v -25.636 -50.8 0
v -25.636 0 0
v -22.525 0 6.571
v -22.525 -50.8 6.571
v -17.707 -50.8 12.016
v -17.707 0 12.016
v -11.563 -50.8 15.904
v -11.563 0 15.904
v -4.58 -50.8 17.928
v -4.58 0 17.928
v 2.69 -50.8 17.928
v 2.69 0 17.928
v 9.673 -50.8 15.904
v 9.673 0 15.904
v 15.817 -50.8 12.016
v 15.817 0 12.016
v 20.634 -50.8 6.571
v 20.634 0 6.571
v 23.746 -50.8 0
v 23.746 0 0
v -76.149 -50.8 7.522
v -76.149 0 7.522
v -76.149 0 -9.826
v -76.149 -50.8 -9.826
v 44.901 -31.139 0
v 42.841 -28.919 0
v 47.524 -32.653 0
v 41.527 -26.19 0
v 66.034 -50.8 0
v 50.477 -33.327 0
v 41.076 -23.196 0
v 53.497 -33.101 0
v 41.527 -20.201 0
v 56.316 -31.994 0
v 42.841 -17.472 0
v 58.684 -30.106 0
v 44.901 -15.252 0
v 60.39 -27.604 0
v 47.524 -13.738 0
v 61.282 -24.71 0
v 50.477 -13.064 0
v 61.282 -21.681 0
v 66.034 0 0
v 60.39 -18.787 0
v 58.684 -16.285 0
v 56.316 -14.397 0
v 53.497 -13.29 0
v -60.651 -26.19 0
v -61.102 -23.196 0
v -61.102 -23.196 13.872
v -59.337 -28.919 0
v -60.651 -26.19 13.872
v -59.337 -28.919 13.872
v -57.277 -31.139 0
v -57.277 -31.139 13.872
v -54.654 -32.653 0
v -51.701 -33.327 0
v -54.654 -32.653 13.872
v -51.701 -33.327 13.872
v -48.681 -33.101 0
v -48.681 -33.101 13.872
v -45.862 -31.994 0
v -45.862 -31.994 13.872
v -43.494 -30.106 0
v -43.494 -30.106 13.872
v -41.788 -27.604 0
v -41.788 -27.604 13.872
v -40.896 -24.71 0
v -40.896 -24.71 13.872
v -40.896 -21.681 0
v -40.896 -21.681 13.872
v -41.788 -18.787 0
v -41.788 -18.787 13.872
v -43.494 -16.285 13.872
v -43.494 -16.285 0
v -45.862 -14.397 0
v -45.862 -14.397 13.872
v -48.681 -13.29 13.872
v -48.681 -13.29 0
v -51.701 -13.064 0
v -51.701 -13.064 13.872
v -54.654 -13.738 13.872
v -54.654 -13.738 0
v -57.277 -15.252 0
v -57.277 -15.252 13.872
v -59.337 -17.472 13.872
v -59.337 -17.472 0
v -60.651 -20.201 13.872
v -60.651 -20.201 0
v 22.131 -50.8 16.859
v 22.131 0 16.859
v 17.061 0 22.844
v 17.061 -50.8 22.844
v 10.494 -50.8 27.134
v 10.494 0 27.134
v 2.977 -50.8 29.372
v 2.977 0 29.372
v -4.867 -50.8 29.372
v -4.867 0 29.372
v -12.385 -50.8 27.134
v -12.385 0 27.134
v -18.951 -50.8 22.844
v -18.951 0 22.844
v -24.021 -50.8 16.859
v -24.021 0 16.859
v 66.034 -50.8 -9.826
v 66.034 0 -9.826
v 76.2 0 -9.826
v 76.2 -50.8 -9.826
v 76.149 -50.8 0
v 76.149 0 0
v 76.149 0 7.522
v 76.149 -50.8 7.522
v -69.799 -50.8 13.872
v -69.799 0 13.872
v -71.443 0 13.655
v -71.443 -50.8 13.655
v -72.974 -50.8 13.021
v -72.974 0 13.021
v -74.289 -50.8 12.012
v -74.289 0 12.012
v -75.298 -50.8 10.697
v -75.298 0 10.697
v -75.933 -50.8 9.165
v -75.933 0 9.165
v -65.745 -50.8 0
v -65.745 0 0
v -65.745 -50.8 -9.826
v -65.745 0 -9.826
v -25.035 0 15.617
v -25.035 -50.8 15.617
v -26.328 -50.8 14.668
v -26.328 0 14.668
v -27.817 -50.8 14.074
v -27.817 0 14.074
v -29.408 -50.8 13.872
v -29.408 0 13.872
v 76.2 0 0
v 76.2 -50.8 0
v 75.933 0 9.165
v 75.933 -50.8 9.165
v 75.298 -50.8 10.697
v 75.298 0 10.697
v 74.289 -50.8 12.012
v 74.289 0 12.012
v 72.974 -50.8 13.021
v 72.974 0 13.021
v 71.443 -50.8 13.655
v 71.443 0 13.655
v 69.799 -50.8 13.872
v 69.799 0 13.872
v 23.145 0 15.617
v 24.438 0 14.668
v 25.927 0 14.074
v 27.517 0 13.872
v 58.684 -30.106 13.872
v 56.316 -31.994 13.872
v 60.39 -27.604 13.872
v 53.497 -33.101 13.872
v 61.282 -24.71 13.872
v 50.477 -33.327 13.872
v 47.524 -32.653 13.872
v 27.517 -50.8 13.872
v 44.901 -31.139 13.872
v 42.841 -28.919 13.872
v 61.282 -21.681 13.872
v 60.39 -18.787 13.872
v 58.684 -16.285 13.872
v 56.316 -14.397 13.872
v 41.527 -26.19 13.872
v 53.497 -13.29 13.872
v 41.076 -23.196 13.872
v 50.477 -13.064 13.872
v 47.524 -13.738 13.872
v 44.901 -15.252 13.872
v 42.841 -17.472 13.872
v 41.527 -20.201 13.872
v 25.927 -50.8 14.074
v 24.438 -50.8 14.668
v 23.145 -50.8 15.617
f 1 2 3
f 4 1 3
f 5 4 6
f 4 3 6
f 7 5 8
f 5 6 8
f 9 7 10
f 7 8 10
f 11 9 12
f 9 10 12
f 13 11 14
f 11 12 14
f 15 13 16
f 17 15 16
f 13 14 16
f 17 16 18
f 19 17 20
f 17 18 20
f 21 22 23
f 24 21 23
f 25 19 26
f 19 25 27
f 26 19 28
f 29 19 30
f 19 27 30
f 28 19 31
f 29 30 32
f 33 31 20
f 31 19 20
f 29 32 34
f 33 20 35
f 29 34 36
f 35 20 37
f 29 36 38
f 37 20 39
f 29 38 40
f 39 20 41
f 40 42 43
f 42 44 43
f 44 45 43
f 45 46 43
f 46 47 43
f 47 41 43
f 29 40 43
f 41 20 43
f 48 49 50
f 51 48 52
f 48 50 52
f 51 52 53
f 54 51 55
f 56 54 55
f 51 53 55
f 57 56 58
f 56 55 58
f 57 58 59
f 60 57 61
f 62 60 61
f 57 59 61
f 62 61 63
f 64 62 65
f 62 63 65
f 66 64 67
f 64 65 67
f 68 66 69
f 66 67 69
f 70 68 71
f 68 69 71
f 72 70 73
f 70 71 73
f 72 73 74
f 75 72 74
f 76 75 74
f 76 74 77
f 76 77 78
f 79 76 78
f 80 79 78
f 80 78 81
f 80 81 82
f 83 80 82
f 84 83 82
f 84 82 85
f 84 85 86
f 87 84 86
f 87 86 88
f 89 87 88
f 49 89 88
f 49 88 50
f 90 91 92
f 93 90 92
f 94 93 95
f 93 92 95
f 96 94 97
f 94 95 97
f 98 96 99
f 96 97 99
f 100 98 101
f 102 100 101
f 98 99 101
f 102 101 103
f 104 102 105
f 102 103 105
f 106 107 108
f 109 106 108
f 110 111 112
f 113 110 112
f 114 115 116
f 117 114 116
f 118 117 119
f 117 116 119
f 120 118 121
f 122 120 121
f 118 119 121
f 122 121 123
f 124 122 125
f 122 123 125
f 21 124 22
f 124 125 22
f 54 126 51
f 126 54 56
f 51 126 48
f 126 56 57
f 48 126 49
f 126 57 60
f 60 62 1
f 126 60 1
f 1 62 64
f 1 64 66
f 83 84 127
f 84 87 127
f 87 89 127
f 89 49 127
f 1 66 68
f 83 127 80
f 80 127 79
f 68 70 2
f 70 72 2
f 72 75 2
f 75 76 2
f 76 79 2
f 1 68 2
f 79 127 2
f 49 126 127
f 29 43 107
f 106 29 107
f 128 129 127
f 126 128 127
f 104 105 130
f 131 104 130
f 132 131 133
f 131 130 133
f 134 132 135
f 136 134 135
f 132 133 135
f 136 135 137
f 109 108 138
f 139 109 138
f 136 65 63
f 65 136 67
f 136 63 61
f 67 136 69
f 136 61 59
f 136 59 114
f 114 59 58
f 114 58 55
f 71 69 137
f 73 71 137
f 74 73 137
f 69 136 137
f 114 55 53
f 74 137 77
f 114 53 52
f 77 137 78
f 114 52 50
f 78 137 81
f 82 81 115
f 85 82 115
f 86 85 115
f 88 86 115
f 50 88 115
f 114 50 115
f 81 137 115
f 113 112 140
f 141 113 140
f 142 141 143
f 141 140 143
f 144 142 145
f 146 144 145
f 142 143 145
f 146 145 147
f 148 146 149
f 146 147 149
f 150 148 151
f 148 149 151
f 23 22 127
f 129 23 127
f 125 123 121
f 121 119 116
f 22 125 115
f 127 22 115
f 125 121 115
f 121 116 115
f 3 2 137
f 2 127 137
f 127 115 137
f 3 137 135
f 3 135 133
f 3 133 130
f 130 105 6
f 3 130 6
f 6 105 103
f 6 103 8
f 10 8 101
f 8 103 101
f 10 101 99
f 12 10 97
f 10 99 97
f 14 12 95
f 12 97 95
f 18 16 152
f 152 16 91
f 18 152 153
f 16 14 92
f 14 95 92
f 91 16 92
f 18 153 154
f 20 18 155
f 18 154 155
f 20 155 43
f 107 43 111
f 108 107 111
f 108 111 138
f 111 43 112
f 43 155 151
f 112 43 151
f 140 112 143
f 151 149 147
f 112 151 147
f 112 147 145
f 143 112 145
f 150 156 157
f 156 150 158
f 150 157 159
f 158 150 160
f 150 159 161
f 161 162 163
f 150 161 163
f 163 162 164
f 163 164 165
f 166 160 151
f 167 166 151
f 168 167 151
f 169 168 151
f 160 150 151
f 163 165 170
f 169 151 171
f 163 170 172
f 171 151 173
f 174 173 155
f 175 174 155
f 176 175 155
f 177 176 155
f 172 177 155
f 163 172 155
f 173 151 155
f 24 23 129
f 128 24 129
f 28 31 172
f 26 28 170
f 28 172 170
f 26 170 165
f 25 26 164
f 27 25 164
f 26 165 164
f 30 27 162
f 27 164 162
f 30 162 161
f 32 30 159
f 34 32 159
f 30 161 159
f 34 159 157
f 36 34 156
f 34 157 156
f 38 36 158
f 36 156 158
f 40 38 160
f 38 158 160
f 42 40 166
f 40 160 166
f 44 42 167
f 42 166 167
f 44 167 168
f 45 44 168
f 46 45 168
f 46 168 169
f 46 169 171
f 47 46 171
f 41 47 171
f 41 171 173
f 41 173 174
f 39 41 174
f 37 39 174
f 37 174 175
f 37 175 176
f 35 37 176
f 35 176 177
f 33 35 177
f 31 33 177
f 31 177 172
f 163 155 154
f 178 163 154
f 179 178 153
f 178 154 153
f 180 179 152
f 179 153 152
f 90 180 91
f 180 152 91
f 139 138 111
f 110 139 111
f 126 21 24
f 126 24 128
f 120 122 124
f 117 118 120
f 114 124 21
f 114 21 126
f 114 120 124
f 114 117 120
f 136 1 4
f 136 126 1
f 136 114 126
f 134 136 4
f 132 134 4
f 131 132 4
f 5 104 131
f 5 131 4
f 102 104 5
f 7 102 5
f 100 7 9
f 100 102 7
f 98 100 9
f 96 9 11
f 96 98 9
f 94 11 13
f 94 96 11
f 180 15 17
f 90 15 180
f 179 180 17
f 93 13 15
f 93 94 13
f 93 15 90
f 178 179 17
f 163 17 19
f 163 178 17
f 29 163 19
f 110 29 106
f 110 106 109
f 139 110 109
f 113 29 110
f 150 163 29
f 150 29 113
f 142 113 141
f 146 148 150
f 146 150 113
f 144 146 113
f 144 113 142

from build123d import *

# Parameters (mm, degrees)
F1_DEPTH = 50.8
F3_D     = 20.32


with BuildPart() as f1:
    # F0 (on Front) → F1 (new body)
    with BuildSketch(Plane.XZ):
        with BuildLine():
            ThreePointArc((-25.6362788903, 0), (-0.9451183533, 18.1852056191), (23.7460421838, 0))
            Line((23.7460421838, 0), (66.0344064236, 0))
            Line((66.0344064236, 0), (66.0344064236, -9.8256887868))
            Line((66.0344064236, -9.8256887868), (76.2, -9.8256887868))
            Line((76.2, -9.8256887868), (76.2, 0))
            Line((76.2, 0), (76.149083674, 0))
            Line((76.149083674, 0), (76.149083674, 7.5215598732))
            ThreePointArc((76.149083674, 7.5215598732), (74.2892117345, 12.0116879338), (69.799083674, 13.8715598732))
            Line((69.799083674, 13.8715598732), (27.5173505631, 13.8715598732))
            ThreePointArc((27.5173505631, 13.8715598732), (24.4377427448, 14.6683161648), (22.1309528492, 16.8586415471))
            ThreePointArc((22.1309528492, 16.8586415471), (-0.9451183533, 29.6557116959), (-24.0211895558, 16.8586415471))
            ThreePointArc((-24.0211895558, 16.8586415471), (-26.3279794513, 14.6683161648), (-29.4075872696, 13.8715598732))
            Line((-29.4075872696, 13.8715598732), (-69.799083674, 13.8715598732))
            ThreePointArc((-69.799083674, 13.8715598732), (-74.2892117345, 12.0116879338), (-76.149083674, 7.5215598732))
            Line((-76.149083674, 7.5215598732), (-76.149083674, 0))
            Line((-76.149083674, 0), (-76.149083674, -9.8256887868))
            Line((-76.149083674, -9.8256887868), (-65.7454133034, -9.8256887868))
            Line((-65.7454133034, -9.8256887868), (-65.7454133034, 0))
            Line((-65.7454133034, 0), (-25.6362788903, 0))
        make_face()
    extrude(amount=F1_DEPTH)

    # F3 (through all)
    with Locations(Plane(origin=(0, 0, 0), x_dir=(1, 0, 0), z_dir=(0, 0, -1))):
        with Locations((-50.9421490133, 23.1955610216), (51.2357614934, 23.1955610216)):
            Hole(F3_D / 2)


solid = f1.part
